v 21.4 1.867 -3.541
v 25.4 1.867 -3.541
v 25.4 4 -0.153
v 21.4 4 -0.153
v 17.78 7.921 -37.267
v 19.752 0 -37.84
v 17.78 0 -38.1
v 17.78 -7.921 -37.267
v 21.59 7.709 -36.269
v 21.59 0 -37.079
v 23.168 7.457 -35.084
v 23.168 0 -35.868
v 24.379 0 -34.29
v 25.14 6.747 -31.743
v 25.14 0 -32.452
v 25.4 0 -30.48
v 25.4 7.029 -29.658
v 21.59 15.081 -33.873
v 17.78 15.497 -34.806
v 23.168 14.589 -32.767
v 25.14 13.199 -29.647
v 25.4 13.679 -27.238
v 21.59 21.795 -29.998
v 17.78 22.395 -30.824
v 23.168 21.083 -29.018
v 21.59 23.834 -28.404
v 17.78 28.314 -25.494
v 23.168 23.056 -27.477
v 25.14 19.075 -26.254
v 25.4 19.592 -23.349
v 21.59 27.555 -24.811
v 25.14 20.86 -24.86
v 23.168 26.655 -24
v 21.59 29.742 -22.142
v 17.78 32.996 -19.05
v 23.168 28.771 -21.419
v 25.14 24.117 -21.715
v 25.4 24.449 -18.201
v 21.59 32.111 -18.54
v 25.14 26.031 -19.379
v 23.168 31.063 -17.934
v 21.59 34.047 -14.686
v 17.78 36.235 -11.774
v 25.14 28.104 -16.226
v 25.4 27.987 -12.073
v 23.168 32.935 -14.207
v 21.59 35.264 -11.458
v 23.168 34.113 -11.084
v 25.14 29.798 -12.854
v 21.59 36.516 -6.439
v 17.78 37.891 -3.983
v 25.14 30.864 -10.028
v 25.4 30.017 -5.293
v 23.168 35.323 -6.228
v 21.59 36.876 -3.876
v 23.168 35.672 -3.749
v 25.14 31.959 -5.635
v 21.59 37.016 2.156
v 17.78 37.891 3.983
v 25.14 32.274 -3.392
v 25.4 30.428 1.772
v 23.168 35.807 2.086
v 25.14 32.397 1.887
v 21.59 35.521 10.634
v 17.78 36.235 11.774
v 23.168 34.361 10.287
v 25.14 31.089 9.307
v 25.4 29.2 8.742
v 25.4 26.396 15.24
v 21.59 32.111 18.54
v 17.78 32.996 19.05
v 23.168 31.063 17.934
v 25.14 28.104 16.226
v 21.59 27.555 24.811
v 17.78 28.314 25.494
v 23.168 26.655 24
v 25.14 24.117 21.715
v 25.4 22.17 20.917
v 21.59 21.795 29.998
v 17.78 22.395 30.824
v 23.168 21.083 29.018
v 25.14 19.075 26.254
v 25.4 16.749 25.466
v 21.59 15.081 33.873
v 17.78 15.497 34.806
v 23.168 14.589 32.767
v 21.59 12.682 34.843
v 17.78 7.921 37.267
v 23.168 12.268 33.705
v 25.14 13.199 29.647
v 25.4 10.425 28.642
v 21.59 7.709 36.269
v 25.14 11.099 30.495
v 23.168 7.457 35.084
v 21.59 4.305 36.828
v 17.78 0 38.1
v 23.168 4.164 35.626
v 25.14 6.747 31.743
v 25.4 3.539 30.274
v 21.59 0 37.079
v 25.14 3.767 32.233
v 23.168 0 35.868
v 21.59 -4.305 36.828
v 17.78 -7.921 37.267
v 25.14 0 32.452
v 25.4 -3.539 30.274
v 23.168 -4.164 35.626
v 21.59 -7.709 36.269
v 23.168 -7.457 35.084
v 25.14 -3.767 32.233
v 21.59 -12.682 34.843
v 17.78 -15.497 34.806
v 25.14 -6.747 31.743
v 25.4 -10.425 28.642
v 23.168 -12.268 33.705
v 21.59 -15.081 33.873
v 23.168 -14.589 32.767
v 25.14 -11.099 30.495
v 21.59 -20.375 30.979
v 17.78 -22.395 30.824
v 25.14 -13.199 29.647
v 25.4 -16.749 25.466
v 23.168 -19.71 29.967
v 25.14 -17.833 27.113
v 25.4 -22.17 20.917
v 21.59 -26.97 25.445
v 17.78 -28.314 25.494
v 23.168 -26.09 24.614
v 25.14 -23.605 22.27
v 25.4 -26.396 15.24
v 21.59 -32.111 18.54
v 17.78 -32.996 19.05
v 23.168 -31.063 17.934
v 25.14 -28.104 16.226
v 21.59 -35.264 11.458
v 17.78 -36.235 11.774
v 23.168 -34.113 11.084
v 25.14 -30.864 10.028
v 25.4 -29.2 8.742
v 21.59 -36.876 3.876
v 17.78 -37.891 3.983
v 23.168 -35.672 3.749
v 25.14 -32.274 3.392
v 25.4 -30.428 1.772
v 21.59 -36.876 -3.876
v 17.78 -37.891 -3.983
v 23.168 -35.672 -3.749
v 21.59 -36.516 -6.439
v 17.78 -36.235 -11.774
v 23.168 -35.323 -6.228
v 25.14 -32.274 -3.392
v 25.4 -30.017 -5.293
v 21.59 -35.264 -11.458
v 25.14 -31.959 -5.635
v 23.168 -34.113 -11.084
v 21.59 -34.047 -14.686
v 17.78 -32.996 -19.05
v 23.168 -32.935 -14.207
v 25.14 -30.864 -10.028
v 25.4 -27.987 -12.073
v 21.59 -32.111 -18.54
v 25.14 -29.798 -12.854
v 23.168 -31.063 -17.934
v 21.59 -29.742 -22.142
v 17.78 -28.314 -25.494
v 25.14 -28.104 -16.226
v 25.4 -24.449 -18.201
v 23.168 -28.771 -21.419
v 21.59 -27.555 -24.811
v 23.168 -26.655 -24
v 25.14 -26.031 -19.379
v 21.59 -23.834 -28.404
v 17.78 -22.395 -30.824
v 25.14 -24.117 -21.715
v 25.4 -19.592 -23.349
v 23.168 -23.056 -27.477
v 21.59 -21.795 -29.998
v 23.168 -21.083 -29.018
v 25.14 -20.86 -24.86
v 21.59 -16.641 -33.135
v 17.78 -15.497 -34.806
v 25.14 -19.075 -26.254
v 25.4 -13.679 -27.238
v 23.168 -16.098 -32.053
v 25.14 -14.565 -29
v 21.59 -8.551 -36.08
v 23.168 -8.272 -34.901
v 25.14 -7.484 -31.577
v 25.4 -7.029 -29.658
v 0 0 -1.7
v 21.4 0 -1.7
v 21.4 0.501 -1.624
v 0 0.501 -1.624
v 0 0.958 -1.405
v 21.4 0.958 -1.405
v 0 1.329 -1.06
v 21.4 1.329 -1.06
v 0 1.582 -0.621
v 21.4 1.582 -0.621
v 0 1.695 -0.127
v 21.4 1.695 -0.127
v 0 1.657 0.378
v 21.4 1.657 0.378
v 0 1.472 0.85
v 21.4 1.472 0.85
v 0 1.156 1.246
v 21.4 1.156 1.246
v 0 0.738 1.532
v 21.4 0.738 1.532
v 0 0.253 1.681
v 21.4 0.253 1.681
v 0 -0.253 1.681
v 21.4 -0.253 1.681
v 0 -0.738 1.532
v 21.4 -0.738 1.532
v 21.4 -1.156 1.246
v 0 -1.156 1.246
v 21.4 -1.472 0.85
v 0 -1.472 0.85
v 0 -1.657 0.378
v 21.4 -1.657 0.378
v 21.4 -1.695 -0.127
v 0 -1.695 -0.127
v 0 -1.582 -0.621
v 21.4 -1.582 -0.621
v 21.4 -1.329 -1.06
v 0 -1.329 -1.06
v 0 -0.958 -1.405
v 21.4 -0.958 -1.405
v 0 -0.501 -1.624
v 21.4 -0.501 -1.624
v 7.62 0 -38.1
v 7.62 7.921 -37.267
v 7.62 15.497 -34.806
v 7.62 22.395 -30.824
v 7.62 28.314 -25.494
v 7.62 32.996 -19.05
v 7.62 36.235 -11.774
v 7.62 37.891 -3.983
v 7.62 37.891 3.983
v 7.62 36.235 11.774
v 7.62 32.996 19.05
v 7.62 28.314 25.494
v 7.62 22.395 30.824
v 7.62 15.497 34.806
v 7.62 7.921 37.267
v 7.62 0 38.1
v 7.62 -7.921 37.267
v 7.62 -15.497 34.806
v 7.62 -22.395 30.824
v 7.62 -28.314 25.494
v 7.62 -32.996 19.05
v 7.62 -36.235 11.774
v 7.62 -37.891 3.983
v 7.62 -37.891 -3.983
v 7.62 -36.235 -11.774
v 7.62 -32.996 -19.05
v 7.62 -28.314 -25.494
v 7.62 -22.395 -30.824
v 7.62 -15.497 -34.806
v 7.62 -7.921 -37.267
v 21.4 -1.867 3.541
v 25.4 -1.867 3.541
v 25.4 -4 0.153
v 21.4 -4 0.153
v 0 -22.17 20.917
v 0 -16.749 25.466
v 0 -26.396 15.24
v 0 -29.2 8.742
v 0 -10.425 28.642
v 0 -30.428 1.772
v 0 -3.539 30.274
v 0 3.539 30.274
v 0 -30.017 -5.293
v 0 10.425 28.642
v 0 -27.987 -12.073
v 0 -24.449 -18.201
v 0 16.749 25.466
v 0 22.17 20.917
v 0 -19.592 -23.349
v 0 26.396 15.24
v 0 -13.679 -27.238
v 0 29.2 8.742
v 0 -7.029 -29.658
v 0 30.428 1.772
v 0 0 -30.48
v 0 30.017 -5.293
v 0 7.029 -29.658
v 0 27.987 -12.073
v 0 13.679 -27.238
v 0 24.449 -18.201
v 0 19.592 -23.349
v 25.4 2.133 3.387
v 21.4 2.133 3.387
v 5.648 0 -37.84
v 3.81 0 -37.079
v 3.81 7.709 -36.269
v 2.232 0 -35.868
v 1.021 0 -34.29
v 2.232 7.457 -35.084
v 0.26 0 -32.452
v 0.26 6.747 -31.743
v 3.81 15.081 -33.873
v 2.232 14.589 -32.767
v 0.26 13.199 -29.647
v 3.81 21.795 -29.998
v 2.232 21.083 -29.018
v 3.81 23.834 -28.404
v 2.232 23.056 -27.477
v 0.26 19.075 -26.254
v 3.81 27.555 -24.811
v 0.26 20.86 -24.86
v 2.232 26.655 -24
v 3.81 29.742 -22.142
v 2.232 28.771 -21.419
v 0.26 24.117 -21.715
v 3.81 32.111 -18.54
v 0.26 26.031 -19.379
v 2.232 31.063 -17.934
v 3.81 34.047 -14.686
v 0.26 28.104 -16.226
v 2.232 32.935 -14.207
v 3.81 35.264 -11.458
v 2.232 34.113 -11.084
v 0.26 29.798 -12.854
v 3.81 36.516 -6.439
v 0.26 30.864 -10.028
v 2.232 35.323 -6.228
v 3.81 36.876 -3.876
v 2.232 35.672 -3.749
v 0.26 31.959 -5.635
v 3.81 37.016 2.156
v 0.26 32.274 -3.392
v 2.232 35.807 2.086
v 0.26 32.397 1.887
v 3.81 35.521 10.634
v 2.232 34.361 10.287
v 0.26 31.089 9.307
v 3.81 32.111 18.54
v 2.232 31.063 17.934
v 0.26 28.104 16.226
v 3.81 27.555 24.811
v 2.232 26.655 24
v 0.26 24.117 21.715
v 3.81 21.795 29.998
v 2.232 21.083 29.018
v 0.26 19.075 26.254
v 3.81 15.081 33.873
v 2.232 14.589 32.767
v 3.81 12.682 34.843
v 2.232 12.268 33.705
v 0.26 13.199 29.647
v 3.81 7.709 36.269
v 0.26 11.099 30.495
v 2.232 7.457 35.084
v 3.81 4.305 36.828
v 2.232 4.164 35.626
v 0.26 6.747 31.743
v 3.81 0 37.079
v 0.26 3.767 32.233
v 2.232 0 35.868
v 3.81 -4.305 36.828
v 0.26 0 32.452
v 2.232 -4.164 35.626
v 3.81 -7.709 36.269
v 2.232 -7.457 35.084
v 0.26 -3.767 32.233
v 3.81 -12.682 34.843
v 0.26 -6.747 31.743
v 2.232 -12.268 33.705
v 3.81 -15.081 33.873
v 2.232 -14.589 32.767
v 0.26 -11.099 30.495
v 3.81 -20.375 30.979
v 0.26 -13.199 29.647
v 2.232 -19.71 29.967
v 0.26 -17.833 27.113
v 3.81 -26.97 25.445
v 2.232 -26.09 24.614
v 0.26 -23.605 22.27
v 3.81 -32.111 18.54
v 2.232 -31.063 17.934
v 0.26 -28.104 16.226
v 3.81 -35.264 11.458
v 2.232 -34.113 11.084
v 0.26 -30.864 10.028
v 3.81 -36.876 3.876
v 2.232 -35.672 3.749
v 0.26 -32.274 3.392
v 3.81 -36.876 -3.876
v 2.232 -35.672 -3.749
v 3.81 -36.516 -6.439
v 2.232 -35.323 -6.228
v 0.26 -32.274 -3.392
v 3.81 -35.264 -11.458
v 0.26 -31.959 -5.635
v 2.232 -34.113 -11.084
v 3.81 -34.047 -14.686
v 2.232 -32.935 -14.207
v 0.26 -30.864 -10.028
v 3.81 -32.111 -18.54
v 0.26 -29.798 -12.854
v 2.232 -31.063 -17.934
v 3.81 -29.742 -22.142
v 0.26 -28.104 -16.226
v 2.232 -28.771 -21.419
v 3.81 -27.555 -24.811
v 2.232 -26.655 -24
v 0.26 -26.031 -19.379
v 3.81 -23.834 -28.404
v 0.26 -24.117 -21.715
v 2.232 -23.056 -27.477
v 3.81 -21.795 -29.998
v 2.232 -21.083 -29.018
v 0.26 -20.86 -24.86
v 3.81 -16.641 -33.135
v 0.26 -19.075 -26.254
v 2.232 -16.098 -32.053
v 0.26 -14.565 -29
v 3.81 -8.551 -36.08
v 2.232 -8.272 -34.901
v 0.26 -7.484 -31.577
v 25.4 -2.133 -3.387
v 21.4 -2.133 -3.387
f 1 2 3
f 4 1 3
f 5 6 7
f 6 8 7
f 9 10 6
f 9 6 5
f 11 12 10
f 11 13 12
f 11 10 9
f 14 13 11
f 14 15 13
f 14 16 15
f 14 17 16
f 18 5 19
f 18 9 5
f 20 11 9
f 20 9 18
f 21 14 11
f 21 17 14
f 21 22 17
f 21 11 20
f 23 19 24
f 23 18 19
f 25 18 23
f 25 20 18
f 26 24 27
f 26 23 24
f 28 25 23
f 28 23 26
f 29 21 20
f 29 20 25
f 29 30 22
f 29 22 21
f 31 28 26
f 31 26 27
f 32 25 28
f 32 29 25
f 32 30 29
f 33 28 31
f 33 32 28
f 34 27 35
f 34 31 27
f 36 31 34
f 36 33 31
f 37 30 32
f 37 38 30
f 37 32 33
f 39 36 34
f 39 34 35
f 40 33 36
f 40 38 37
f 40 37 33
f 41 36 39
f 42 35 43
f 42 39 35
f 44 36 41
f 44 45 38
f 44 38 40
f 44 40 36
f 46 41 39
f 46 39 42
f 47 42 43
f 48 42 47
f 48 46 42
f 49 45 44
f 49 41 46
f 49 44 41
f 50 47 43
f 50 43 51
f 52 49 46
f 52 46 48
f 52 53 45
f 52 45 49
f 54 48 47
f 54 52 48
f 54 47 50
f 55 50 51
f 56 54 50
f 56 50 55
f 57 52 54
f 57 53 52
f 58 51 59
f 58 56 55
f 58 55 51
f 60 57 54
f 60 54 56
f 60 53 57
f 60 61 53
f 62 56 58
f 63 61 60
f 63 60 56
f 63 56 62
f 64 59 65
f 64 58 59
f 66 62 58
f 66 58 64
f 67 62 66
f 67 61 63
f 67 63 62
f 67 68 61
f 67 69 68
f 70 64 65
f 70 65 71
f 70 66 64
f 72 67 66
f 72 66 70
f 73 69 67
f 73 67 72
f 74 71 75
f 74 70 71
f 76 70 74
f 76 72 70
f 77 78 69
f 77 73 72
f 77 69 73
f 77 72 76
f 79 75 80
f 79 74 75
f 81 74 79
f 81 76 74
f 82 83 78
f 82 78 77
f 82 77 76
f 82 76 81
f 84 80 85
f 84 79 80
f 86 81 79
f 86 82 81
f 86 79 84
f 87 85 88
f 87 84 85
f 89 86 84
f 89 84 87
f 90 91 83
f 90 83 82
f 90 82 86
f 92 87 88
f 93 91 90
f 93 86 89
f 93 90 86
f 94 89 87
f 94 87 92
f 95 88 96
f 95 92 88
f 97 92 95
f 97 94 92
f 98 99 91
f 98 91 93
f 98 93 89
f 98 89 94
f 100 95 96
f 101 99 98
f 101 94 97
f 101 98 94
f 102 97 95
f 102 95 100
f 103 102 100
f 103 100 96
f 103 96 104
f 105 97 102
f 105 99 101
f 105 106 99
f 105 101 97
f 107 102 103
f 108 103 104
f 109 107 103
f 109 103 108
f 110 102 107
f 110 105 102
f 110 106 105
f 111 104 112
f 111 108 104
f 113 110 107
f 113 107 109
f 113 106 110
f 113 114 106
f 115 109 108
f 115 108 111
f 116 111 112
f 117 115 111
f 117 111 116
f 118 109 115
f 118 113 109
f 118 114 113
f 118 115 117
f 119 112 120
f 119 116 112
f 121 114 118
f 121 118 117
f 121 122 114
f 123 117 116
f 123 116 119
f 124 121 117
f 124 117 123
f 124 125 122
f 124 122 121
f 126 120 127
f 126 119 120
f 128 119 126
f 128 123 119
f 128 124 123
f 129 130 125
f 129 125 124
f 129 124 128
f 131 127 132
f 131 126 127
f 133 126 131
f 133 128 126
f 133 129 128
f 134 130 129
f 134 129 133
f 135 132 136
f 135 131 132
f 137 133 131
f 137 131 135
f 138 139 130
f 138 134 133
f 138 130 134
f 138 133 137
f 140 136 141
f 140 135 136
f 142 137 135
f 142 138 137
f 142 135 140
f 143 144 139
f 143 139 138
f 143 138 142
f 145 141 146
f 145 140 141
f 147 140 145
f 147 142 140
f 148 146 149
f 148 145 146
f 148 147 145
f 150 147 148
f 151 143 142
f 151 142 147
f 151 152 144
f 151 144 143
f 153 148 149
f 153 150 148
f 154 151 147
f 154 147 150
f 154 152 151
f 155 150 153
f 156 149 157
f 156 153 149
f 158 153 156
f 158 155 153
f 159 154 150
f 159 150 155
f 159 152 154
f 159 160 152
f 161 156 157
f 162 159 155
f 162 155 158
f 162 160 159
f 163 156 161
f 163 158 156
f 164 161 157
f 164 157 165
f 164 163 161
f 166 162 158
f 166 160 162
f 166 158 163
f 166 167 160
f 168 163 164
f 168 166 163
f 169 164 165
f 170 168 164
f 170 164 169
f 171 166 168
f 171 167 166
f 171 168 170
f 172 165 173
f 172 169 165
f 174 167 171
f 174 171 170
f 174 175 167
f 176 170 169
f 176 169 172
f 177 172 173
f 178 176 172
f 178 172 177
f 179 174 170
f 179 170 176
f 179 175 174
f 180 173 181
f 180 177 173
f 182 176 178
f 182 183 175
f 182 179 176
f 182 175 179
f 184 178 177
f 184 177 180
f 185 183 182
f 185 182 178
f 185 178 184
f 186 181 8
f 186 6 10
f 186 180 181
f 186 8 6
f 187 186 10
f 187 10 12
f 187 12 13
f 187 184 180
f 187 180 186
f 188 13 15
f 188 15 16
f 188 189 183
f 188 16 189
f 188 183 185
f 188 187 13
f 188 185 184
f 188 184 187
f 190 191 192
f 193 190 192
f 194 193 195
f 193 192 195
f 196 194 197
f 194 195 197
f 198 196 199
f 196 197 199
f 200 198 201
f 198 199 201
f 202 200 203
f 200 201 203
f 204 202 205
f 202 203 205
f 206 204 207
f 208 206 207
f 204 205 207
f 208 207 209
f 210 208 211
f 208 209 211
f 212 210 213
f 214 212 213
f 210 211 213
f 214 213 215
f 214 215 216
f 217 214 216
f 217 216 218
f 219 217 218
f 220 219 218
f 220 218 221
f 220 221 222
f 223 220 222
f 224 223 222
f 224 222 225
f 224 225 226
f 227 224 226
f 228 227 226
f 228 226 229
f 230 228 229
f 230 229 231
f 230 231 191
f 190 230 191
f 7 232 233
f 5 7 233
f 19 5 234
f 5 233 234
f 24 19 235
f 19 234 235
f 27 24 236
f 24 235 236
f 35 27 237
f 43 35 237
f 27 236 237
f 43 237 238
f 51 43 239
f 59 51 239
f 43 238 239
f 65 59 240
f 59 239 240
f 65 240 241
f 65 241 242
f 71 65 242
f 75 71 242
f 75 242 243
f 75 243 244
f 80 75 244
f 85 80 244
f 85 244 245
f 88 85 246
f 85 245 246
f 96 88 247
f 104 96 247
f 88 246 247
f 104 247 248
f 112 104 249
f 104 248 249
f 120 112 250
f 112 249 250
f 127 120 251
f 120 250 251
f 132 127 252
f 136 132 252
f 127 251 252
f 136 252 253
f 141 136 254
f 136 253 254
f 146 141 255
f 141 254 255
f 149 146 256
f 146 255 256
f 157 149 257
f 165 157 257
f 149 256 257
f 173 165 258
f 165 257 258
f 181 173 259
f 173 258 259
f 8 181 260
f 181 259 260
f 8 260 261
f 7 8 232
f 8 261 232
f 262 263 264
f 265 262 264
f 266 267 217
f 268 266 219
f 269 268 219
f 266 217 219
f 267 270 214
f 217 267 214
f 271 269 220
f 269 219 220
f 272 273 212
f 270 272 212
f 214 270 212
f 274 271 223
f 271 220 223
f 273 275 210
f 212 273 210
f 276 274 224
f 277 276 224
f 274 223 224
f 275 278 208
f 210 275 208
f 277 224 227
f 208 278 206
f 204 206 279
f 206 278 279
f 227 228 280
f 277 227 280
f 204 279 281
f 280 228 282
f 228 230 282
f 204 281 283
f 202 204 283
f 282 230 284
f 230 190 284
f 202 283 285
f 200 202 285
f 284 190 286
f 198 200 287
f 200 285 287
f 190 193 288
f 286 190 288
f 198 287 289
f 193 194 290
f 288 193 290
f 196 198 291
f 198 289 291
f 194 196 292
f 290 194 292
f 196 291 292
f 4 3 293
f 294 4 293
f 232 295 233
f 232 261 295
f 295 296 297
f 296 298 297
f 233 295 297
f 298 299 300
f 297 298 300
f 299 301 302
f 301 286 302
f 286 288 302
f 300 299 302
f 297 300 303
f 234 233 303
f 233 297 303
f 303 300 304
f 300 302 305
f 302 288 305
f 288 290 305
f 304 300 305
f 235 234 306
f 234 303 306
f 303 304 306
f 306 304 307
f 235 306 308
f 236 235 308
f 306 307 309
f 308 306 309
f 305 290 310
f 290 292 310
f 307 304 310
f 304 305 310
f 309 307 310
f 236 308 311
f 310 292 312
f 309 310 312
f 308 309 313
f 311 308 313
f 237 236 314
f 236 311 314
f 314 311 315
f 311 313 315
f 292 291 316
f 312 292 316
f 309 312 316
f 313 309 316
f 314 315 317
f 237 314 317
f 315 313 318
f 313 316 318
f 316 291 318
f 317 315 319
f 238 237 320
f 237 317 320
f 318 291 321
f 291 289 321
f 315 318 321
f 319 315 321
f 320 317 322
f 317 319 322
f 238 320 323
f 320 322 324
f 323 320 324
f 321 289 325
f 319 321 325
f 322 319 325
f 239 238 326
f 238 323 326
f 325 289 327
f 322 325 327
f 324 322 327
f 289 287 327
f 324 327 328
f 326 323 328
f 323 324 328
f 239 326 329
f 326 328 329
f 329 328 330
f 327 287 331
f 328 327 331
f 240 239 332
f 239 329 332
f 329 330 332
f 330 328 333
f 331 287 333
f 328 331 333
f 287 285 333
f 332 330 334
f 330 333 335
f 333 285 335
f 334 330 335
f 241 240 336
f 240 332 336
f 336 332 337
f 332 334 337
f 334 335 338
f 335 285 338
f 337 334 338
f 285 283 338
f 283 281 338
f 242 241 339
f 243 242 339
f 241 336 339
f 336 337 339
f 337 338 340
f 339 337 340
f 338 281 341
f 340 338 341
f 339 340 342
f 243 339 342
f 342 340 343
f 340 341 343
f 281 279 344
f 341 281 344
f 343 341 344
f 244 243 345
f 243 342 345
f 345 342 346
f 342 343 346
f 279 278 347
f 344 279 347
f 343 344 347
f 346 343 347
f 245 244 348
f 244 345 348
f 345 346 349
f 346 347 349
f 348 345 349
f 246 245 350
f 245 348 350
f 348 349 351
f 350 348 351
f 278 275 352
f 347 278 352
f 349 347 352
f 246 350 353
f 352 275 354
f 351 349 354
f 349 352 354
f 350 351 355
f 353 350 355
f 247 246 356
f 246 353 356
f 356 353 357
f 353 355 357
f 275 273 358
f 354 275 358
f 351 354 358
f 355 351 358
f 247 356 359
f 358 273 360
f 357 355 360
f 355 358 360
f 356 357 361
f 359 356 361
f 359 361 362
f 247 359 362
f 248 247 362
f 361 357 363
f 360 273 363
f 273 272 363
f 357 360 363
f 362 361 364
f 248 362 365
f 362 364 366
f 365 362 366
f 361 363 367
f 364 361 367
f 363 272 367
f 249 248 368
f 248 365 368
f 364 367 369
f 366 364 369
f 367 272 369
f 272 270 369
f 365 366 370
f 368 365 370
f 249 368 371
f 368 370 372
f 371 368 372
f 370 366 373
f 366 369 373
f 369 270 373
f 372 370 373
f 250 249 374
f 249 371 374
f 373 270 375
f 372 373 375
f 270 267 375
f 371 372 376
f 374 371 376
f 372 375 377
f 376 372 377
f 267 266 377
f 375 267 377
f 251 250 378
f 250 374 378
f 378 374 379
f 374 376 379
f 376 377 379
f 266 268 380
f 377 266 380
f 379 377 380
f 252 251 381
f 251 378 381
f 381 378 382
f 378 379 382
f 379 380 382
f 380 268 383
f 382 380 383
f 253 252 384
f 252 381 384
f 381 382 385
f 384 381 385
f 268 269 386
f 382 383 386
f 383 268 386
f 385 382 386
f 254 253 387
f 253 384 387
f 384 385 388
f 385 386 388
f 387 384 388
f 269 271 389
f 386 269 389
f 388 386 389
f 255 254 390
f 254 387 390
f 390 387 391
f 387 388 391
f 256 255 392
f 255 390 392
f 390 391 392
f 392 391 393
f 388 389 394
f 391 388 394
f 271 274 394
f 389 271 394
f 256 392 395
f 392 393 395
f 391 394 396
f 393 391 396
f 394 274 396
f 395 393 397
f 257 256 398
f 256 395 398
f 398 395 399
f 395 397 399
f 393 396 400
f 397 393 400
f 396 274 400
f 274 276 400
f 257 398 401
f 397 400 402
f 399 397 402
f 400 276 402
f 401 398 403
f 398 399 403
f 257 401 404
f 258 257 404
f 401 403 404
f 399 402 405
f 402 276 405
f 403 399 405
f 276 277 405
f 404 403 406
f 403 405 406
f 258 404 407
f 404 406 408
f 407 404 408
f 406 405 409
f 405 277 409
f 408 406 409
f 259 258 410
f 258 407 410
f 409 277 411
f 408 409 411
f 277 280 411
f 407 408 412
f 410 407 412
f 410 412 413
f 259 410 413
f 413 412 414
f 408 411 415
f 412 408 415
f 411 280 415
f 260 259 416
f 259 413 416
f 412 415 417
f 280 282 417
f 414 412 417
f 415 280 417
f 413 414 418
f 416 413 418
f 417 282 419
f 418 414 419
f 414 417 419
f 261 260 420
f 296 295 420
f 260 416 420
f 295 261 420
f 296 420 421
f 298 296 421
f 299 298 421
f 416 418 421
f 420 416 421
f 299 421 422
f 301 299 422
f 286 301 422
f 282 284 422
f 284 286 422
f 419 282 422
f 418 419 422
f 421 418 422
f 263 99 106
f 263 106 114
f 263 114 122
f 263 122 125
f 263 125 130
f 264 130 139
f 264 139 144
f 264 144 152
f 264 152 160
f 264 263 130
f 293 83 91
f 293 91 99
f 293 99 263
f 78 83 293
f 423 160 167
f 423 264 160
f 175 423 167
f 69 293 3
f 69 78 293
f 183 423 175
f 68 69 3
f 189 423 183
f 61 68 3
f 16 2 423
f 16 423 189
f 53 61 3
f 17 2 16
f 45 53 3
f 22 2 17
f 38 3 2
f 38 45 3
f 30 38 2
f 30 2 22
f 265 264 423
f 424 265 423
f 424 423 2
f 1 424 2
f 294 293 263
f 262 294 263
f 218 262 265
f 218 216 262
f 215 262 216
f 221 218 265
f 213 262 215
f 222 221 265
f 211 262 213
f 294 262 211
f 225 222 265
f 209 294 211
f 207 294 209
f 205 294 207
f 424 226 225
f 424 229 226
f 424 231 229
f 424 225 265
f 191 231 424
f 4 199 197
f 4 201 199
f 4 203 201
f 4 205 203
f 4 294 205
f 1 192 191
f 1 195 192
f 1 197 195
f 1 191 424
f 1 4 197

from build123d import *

# Parameters (mm, degrees)
SKETCH2_R           = 38.1
BOSS_EXTRUDE2_DEPTH = 25.4
FILLET3_R           = 7.62
FILLET5_R           = 7.62
SKETCH4_R           = 1.7
CUT_EXTRUDE1_DEPTH  = 25.4
CUT_EXTRUDE2_DEPTH  = 4


with BuildPart() as part:
    # Sketch2 → Boss-Extrude2 (new body)
    with BuildSketch(Plane(origin=(0, 0, 0), x_dir=(0, 0, -1), z_dir=(1, 0, 0))):
        Circle(SKETCH2_R)
    extrude(amount=BOSS_EXTRUDE2_DEPTH)

    # Fillet3
    fillet3_edges = [part.edges().sort_by_distance(p)[0] for p in [
        (25.4, 0, 38.1),
    ]]
    fillet(fillet3_edges, radius=FILLET3_R)

    # Fillet5
    fillet5_edges = [part.edges().sort_by_distance(p)[0] for p in [
        (0, 0, 38.1),
    ]]
    fillet(fillet5_edges, radius=FILLET5_R)

    # Sketch4 → Cut-Extrude1 (cut)
    with BuildSketch(Plane(origin=(25.4, 0, 0), x_dir=(0, 0, -1), z_dir=(1, 0, 0))):
        Circle(SKETCH4_R)
    extrude(amount=-CUT_EXTRUDE1_DEPTH, mode=Mode.SUBTRACT)

    # Sketch5 → Cut-Extrude2 (cut)
    with BuildSketch(Plane(origin=(25.4, 0, 0), x_dir=(0, 0, -1), z_dir=(1, 0, 0))):
        Polygon((-3.387274931, 2.13272866), (-3.540634665, -1.86710181), (-0.153359734, -3.99983047), (3.387274931, -2.13272866), (3.540634665, 1.86710181), (0.153359734, 3.99983047), align=None)
    extrude(amount=-CUT_EXTRUDE2_DEPTH, mode=Mode.SUBTRACT)


solid = part.part
